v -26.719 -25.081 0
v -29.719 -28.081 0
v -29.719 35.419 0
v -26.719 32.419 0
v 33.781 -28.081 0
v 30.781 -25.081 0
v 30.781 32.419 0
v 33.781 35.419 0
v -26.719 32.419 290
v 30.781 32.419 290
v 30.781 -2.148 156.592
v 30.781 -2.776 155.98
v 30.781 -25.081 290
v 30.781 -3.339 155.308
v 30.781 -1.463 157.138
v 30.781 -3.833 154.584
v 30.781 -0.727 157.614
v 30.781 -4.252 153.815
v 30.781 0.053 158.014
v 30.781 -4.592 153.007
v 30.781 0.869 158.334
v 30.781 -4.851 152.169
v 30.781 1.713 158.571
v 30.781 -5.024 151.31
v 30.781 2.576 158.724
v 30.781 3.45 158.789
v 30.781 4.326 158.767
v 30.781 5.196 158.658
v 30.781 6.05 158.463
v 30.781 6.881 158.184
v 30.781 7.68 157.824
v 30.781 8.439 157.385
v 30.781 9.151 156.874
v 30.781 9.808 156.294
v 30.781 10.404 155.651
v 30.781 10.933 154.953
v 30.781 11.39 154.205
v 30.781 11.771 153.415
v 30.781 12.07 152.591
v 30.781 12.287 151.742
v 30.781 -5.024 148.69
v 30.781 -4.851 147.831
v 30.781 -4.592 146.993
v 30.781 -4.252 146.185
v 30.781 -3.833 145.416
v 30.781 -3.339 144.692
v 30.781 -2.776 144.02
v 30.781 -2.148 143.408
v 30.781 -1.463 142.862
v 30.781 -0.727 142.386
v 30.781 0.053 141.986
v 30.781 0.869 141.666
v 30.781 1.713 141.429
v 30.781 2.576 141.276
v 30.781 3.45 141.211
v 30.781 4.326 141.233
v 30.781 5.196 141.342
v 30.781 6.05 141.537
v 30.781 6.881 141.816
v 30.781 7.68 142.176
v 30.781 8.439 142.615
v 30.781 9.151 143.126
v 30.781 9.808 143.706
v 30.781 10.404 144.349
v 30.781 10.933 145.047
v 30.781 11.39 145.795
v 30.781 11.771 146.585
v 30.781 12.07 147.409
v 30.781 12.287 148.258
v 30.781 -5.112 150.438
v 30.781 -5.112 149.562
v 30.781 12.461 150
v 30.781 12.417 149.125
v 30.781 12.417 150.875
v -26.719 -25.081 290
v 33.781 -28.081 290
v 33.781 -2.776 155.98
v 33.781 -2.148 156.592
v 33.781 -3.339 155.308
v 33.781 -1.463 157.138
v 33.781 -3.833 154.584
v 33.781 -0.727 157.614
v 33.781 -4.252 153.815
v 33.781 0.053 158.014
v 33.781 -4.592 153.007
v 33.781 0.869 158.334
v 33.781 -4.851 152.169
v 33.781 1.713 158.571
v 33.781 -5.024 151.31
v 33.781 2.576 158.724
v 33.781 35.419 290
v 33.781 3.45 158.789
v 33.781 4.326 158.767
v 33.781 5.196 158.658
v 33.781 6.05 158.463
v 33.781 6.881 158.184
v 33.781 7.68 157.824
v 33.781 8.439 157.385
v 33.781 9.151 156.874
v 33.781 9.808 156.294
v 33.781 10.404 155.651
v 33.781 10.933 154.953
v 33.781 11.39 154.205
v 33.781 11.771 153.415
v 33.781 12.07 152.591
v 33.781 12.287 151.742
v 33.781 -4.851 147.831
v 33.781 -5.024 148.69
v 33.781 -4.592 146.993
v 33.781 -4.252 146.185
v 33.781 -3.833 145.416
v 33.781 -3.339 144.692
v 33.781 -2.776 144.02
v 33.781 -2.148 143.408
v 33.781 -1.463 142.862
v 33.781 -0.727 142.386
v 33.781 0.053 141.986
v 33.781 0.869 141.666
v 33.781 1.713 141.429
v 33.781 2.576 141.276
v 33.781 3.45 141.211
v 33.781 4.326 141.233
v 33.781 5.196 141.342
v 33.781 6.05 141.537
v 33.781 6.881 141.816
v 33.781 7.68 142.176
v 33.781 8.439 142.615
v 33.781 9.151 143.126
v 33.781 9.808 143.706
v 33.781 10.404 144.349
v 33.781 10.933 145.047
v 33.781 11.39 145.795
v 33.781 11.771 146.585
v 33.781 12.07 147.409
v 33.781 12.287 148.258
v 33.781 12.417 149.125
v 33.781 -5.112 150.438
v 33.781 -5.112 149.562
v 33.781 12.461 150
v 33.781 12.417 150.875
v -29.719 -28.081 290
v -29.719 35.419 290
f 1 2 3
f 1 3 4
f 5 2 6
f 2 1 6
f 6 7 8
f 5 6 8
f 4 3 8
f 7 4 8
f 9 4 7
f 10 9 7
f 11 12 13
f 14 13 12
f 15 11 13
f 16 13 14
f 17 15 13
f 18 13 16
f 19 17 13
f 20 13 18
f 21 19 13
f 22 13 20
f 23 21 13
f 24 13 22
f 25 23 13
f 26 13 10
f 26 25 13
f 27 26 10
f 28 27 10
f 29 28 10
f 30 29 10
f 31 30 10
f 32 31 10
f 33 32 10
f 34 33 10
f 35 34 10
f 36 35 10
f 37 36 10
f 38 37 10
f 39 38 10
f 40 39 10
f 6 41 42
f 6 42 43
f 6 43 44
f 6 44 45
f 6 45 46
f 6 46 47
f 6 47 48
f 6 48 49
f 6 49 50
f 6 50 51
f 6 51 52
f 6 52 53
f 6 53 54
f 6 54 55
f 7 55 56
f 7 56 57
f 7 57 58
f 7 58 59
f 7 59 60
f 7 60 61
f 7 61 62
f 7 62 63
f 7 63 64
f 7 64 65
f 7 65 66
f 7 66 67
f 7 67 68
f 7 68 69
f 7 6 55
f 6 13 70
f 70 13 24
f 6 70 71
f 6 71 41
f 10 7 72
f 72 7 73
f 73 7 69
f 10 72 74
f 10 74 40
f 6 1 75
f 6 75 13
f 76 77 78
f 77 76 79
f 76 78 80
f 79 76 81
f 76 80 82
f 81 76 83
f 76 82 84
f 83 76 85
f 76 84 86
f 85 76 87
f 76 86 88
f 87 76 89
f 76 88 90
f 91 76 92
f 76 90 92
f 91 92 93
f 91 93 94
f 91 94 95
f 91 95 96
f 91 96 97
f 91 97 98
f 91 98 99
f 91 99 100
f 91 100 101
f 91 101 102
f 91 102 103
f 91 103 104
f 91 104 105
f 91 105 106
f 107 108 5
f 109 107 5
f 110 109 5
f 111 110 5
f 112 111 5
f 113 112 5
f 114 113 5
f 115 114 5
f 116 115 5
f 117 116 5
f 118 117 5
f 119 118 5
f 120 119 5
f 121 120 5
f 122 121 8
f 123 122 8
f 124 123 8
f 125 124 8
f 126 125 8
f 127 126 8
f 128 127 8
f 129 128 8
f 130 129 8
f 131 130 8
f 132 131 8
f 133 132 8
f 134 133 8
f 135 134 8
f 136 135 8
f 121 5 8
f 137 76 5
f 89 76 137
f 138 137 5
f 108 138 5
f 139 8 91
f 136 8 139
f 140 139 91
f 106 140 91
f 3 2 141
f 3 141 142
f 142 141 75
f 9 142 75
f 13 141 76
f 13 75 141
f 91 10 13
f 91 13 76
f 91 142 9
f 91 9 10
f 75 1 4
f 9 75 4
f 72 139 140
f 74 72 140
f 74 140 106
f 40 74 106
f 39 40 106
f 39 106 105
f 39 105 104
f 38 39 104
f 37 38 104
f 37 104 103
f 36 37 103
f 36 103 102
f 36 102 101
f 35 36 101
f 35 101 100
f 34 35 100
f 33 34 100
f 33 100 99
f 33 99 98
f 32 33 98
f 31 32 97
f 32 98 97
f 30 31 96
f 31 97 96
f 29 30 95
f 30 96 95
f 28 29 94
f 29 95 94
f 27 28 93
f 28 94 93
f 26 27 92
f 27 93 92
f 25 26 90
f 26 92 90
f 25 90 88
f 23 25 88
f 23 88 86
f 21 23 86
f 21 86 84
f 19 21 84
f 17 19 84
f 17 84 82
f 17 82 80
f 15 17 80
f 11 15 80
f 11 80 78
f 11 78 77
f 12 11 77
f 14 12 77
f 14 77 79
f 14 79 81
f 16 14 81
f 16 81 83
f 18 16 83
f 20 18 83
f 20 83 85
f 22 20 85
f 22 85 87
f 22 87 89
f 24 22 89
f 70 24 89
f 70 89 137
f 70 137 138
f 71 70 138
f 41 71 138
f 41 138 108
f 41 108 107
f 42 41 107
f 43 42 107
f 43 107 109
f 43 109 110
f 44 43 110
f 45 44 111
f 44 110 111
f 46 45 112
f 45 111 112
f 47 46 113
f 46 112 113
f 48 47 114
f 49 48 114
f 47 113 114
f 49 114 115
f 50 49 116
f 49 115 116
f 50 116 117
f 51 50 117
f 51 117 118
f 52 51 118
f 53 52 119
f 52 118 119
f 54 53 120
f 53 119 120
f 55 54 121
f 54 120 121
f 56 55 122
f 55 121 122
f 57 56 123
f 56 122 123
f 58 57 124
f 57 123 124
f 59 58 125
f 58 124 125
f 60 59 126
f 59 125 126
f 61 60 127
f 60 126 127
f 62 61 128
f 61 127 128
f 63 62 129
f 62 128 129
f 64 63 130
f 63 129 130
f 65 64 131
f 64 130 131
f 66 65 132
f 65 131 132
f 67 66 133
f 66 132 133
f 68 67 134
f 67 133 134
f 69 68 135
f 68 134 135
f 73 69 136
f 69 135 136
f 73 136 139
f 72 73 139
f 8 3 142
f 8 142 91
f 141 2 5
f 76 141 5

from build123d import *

# Parameters (mm, degrees)
F0_W     = 63.5
F0_H     = 63.5
F0_W_2   = 57.5
F0_H_2   = 57.5
F1_DEPTH = 290
F2_R     = 8.791749
F3_DEPTH = 25


with BuildPart() as f1:
    # F0 (on Top) → F1 (new body)
    with BuildSketch(Plane.XY):
        with Locations((2.03071, 3.669284)):
            Rectangle(F0_W, F0_H)
        with Locations((2.03071, 3.669284)):
            Rectangle(F0_W_2, F0_H_2, mode=Mode.SUBTRACT)
    extrude(amount=F1_DEPTH)

    # F2 (on face) → F3 (cut)
    with BuildSketch(Plane.YZ.offset(33.78071)):
        with Locations((3.669284, 150)):
            Circle(F2_R)
    extrude(amount=-F3_DEPTH, mode=Mode.SUBTRACT)


solid = f1.part
